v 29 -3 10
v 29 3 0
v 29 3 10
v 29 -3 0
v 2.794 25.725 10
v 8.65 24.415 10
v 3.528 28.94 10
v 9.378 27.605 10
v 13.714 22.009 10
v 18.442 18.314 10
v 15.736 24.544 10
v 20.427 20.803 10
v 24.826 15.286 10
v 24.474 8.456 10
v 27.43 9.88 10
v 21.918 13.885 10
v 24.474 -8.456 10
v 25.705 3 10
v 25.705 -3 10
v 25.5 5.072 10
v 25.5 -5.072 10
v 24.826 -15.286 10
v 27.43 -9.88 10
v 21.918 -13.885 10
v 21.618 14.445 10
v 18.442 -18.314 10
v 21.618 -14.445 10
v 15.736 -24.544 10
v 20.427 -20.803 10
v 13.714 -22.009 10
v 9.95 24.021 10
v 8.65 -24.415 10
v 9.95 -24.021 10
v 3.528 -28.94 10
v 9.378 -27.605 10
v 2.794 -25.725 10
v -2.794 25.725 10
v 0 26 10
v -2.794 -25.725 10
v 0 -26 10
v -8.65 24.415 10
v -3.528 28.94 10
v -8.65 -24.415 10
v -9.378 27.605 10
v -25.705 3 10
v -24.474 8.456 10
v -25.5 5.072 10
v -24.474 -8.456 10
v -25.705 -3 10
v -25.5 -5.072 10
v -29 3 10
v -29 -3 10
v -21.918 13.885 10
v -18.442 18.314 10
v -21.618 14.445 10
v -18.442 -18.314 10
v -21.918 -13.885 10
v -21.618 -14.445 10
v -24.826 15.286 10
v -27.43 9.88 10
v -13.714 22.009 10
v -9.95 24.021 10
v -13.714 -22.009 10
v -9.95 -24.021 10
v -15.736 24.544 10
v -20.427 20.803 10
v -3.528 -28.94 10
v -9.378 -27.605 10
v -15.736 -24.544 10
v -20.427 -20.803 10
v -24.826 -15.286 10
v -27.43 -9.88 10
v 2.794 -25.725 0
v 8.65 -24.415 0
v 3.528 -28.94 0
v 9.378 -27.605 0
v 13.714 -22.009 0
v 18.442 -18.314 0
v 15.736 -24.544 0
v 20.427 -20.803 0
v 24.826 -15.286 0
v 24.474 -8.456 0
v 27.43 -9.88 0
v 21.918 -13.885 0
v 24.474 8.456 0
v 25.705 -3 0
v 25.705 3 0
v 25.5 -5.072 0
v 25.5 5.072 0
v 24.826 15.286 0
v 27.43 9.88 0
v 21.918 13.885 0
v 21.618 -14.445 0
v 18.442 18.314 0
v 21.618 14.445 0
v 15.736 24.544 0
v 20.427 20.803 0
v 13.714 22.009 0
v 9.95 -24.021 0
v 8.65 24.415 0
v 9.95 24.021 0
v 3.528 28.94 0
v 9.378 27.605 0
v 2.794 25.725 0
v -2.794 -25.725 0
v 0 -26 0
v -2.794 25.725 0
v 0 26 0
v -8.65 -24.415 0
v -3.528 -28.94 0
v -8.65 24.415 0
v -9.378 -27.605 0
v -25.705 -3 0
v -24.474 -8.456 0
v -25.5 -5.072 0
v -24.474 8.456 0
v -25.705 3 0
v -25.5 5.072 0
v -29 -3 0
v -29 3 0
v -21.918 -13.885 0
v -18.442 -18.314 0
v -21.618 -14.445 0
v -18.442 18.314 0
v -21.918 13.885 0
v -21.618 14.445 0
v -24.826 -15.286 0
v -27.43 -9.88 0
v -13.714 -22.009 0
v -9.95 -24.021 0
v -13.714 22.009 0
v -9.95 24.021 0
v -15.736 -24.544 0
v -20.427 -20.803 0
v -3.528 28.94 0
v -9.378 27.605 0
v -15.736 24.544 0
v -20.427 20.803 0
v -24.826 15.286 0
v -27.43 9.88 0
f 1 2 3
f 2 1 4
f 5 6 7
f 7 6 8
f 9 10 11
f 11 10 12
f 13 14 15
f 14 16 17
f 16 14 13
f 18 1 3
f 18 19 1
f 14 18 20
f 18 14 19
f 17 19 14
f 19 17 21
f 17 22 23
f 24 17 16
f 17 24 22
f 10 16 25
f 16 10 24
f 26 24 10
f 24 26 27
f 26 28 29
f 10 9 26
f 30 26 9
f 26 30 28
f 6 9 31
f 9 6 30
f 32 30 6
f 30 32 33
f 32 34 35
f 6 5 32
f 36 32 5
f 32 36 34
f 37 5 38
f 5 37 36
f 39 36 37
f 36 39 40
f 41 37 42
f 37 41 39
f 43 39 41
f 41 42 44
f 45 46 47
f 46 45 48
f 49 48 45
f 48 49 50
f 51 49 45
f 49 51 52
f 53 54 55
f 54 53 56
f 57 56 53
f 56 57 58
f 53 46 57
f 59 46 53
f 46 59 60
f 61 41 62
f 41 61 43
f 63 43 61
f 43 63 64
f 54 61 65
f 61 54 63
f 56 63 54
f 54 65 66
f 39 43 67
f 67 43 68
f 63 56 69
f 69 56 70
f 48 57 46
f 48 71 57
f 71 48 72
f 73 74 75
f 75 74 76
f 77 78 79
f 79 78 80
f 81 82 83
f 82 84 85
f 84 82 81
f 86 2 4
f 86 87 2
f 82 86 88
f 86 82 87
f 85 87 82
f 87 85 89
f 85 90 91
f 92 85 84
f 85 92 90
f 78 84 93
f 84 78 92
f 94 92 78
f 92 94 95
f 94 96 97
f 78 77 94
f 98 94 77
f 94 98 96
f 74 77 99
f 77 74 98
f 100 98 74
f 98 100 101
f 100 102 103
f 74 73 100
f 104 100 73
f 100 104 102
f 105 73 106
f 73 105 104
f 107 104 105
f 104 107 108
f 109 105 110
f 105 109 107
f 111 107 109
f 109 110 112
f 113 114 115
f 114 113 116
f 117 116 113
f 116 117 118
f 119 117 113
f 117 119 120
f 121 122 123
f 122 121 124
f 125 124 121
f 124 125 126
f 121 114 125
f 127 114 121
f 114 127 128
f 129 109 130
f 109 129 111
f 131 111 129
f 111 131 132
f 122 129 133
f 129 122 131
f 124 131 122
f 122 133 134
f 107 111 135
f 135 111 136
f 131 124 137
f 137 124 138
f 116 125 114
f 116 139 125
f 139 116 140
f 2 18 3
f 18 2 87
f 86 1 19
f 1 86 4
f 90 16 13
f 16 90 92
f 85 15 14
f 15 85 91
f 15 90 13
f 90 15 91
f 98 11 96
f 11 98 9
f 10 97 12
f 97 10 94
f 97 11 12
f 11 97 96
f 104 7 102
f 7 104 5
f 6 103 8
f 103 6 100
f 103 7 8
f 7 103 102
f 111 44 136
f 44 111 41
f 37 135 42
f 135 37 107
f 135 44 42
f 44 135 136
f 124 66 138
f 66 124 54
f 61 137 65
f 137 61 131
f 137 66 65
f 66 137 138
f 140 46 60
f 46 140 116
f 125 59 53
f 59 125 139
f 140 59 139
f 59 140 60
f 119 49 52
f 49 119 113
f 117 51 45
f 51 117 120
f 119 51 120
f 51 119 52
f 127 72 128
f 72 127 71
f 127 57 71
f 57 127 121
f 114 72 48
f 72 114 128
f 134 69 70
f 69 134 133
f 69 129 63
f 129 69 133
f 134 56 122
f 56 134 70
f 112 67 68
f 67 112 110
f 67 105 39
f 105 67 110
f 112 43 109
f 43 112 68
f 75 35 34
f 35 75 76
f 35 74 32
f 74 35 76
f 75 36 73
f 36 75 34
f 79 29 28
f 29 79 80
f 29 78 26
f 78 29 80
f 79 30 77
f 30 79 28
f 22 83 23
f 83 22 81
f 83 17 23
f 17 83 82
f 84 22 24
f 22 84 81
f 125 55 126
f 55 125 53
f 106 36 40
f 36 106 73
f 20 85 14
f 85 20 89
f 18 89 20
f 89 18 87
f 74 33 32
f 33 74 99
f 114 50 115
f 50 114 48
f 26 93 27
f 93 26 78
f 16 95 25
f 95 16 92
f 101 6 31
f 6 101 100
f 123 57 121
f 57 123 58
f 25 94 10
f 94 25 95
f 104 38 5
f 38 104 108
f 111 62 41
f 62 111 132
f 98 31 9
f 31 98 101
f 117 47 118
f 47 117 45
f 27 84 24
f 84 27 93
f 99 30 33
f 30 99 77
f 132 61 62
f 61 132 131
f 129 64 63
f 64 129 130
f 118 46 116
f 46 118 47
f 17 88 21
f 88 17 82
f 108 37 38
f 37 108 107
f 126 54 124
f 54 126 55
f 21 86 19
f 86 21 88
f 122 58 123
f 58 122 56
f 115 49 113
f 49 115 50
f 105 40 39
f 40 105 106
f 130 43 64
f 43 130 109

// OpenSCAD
$fn = 32;

// ----------------------------------------------------------------------
// Spur blank: plain gear blank
// ----------------------------------------------------------------------

// --- parameters (mm) ---
disc_r = 26;              // blank root radius
disc_t = 10;              // blank thickness
n_teeth = 14;             // stub tooth count
tooth_w = 6;              // tooth width at the root
tooth_h = 3;              // tooth height above the root

out_r = disc_r + tooth_h;  // tip radius
bbox_x = 58.0;  // measured width over the teeth
bbox_y = 57.88;  // measured depth over the teeth

union() {
  cylinder(r = disc_r, h = disc_t);
  for (i = [0 : n_teeth - 1])
    rotate([0, 0, i * 360 / n_teeth])
      translate([disc_r - 1, -tooth_w / 2, 0])
        cube([tooth_h + 1, tooth_w, disc_t]);
}
